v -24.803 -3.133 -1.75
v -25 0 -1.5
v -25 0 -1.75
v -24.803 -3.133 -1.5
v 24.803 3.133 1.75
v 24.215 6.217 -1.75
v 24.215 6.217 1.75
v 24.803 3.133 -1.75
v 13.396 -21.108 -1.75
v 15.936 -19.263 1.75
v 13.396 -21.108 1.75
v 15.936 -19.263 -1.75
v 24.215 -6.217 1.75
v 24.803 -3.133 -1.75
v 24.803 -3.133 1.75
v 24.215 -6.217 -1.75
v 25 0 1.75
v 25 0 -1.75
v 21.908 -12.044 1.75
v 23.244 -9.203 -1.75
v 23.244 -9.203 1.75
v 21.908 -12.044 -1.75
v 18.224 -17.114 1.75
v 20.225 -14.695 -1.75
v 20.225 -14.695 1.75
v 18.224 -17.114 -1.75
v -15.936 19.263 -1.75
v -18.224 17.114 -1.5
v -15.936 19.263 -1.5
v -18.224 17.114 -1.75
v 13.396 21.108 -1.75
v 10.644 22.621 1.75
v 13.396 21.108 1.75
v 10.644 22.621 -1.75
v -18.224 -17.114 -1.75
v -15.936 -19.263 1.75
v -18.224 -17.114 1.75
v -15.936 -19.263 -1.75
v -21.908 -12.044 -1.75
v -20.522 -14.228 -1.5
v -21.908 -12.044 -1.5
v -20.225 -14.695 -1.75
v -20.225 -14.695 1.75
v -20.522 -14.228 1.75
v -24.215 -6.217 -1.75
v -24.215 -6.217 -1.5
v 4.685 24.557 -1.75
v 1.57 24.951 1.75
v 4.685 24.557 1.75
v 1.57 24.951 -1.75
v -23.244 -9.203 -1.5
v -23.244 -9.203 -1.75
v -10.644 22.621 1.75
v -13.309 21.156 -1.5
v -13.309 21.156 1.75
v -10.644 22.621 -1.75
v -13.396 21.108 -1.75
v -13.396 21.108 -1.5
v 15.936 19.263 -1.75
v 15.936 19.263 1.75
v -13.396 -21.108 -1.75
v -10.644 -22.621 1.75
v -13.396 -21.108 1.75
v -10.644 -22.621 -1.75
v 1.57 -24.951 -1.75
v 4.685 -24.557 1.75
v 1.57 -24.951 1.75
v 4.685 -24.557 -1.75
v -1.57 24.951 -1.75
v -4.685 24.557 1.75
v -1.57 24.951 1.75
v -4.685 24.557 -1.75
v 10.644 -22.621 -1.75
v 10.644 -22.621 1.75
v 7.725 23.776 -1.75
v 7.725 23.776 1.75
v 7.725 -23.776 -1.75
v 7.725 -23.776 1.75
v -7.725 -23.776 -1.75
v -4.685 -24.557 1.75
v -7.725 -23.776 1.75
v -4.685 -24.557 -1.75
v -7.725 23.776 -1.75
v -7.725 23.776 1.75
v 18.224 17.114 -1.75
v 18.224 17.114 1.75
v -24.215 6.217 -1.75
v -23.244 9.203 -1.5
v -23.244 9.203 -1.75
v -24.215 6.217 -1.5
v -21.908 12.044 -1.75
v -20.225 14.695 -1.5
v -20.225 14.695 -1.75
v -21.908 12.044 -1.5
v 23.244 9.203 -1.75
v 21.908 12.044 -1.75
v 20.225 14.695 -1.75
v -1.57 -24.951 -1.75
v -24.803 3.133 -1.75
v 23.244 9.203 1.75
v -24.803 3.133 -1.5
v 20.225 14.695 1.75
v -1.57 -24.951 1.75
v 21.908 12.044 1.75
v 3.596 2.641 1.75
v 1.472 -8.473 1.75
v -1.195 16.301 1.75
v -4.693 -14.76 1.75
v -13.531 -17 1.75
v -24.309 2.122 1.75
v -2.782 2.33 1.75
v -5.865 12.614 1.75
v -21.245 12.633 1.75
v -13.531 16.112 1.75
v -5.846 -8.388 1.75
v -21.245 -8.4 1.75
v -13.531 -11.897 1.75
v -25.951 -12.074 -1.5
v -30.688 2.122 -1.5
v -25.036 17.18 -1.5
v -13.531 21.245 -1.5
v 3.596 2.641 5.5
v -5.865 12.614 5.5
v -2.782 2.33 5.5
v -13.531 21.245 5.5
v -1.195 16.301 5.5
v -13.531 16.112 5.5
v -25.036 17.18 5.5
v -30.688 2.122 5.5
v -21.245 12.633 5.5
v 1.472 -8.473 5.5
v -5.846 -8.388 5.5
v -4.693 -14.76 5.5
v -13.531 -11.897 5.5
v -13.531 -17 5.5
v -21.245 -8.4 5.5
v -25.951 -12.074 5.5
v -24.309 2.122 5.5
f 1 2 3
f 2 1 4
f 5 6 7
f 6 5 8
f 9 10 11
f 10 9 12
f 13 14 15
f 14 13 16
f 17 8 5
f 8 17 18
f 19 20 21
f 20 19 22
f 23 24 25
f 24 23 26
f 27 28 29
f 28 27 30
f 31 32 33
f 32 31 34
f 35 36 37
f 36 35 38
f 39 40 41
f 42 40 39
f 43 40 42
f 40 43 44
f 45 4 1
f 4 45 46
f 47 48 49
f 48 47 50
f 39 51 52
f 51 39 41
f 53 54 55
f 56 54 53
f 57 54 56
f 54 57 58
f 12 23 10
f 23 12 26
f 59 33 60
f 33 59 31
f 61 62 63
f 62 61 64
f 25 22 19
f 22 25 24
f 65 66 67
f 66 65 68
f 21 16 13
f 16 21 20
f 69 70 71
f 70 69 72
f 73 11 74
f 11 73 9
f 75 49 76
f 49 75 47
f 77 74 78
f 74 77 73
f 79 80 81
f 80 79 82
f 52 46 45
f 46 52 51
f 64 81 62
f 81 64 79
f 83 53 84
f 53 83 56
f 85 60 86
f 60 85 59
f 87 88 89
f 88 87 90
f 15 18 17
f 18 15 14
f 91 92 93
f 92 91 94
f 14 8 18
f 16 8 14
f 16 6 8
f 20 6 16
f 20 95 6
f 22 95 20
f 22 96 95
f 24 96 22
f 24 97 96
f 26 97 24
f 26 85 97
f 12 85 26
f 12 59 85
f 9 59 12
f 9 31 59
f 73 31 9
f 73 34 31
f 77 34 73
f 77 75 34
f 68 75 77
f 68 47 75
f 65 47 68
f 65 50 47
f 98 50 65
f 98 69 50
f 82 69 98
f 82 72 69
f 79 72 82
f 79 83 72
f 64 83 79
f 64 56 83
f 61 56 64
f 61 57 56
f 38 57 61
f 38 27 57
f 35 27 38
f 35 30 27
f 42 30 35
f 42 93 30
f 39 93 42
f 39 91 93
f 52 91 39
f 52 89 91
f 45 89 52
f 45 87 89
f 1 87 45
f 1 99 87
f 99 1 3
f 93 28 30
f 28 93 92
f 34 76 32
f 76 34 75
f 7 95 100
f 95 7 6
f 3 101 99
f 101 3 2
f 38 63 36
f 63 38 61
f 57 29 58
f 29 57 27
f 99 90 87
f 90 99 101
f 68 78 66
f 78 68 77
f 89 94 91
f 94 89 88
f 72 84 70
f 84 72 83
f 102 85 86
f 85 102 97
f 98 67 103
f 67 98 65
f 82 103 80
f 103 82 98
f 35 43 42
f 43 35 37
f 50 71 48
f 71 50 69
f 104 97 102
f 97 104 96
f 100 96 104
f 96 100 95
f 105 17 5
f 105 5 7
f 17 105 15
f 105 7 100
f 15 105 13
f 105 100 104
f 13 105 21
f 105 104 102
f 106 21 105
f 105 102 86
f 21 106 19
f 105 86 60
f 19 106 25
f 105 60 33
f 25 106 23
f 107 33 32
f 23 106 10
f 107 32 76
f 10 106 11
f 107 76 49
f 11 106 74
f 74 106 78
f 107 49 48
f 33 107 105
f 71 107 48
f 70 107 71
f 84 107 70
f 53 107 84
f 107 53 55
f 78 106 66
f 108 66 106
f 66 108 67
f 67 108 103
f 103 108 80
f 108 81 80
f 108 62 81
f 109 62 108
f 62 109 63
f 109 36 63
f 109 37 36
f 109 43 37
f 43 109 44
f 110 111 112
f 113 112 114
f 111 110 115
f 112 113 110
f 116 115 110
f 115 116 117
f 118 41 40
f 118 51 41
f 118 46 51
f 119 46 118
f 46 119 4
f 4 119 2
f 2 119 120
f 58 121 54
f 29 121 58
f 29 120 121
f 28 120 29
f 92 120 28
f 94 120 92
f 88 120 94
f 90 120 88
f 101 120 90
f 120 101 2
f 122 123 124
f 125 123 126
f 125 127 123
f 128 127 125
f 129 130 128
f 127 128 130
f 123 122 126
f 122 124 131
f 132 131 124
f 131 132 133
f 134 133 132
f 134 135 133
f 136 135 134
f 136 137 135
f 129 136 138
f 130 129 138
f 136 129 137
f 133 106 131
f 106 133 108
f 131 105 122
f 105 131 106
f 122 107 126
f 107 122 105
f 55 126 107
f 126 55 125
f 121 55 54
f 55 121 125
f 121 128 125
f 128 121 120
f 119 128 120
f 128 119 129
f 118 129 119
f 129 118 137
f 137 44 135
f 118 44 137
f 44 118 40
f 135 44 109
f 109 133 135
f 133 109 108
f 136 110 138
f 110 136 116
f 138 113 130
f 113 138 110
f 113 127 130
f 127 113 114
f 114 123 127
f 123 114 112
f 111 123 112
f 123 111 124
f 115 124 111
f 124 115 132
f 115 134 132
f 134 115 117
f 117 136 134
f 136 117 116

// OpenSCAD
use<Write.scad>

union()
{
linear_extrude(height=3.5, center=true, convexity=10) circle(25, $fn=50);
color([1,1,1]) translate([-13.5,8,2]) scale([1,1,1]) write("o",t=7,h=50, center=true);
}
